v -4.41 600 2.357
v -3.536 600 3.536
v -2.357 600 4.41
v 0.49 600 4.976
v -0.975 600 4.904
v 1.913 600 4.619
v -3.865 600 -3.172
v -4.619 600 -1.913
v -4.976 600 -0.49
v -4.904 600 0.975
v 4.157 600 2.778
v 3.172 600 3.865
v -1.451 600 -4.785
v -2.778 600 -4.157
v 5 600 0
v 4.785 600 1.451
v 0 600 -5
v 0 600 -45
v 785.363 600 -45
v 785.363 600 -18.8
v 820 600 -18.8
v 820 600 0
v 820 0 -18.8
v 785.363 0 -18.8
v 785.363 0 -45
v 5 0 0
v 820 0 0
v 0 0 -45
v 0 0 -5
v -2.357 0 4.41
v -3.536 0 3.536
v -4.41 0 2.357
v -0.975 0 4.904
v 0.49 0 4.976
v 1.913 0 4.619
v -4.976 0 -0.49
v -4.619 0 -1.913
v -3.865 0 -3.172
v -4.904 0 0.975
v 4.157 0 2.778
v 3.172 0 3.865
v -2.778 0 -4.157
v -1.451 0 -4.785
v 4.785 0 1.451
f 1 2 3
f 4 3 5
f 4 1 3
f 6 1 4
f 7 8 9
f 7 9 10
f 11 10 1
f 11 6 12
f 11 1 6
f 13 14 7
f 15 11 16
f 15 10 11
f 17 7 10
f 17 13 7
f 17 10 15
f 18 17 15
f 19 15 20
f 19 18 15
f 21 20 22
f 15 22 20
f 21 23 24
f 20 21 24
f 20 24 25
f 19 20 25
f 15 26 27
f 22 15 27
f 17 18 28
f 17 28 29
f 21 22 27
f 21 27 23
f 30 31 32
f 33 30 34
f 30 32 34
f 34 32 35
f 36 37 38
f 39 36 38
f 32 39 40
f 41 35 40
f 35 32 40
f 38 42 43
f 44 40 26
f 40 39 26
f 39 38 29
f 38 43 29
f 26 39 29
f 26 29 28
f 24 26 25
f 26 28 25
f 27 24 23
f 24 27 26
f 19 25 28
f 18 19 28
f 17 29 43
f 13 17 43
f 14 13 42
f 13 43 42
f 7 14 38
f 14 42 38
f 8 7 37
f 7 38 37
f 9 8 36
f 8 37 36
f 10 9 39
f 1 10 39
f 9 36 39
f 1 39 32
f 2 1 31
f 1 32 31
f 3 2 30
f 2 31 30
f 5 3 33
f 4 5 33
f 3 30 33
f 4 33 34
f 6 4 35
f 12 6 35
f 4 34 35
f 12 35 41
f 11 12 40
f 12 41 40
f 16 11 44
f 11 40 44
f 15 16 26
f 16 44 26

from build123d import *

# Parameters (mm, degrees)
EXTRUDE_1_DEPTH = 600


with BuildPart() as part:
    # Эскиз1 → Бобышка-Вытянуть1 (new body)
    with BuildSketch(Plane(origin=(0, 0, 0), x_dir=(1, 0, 0), z_dir=(0, 1, 0))):
        with BuildLine():
            Line((5, 0), (820, 0))
            Line((820, 0), (820, 18.800386004))
            Line((820, 18.800386004), (785.363179306, 18.800386004))
            Line((785.363179306, 18.800386004), (785.363179306, 45))
            Line((785.363179306, 45), (0, 45))
            Line((0, 45), (0, 5))
            ThreePointArc((0, 5), (-3.535533906, -3.535533906), (5, 0))
        make_face()
    extrude(amount=EXTRUDE_1_DEPTH)


solid = part.part
